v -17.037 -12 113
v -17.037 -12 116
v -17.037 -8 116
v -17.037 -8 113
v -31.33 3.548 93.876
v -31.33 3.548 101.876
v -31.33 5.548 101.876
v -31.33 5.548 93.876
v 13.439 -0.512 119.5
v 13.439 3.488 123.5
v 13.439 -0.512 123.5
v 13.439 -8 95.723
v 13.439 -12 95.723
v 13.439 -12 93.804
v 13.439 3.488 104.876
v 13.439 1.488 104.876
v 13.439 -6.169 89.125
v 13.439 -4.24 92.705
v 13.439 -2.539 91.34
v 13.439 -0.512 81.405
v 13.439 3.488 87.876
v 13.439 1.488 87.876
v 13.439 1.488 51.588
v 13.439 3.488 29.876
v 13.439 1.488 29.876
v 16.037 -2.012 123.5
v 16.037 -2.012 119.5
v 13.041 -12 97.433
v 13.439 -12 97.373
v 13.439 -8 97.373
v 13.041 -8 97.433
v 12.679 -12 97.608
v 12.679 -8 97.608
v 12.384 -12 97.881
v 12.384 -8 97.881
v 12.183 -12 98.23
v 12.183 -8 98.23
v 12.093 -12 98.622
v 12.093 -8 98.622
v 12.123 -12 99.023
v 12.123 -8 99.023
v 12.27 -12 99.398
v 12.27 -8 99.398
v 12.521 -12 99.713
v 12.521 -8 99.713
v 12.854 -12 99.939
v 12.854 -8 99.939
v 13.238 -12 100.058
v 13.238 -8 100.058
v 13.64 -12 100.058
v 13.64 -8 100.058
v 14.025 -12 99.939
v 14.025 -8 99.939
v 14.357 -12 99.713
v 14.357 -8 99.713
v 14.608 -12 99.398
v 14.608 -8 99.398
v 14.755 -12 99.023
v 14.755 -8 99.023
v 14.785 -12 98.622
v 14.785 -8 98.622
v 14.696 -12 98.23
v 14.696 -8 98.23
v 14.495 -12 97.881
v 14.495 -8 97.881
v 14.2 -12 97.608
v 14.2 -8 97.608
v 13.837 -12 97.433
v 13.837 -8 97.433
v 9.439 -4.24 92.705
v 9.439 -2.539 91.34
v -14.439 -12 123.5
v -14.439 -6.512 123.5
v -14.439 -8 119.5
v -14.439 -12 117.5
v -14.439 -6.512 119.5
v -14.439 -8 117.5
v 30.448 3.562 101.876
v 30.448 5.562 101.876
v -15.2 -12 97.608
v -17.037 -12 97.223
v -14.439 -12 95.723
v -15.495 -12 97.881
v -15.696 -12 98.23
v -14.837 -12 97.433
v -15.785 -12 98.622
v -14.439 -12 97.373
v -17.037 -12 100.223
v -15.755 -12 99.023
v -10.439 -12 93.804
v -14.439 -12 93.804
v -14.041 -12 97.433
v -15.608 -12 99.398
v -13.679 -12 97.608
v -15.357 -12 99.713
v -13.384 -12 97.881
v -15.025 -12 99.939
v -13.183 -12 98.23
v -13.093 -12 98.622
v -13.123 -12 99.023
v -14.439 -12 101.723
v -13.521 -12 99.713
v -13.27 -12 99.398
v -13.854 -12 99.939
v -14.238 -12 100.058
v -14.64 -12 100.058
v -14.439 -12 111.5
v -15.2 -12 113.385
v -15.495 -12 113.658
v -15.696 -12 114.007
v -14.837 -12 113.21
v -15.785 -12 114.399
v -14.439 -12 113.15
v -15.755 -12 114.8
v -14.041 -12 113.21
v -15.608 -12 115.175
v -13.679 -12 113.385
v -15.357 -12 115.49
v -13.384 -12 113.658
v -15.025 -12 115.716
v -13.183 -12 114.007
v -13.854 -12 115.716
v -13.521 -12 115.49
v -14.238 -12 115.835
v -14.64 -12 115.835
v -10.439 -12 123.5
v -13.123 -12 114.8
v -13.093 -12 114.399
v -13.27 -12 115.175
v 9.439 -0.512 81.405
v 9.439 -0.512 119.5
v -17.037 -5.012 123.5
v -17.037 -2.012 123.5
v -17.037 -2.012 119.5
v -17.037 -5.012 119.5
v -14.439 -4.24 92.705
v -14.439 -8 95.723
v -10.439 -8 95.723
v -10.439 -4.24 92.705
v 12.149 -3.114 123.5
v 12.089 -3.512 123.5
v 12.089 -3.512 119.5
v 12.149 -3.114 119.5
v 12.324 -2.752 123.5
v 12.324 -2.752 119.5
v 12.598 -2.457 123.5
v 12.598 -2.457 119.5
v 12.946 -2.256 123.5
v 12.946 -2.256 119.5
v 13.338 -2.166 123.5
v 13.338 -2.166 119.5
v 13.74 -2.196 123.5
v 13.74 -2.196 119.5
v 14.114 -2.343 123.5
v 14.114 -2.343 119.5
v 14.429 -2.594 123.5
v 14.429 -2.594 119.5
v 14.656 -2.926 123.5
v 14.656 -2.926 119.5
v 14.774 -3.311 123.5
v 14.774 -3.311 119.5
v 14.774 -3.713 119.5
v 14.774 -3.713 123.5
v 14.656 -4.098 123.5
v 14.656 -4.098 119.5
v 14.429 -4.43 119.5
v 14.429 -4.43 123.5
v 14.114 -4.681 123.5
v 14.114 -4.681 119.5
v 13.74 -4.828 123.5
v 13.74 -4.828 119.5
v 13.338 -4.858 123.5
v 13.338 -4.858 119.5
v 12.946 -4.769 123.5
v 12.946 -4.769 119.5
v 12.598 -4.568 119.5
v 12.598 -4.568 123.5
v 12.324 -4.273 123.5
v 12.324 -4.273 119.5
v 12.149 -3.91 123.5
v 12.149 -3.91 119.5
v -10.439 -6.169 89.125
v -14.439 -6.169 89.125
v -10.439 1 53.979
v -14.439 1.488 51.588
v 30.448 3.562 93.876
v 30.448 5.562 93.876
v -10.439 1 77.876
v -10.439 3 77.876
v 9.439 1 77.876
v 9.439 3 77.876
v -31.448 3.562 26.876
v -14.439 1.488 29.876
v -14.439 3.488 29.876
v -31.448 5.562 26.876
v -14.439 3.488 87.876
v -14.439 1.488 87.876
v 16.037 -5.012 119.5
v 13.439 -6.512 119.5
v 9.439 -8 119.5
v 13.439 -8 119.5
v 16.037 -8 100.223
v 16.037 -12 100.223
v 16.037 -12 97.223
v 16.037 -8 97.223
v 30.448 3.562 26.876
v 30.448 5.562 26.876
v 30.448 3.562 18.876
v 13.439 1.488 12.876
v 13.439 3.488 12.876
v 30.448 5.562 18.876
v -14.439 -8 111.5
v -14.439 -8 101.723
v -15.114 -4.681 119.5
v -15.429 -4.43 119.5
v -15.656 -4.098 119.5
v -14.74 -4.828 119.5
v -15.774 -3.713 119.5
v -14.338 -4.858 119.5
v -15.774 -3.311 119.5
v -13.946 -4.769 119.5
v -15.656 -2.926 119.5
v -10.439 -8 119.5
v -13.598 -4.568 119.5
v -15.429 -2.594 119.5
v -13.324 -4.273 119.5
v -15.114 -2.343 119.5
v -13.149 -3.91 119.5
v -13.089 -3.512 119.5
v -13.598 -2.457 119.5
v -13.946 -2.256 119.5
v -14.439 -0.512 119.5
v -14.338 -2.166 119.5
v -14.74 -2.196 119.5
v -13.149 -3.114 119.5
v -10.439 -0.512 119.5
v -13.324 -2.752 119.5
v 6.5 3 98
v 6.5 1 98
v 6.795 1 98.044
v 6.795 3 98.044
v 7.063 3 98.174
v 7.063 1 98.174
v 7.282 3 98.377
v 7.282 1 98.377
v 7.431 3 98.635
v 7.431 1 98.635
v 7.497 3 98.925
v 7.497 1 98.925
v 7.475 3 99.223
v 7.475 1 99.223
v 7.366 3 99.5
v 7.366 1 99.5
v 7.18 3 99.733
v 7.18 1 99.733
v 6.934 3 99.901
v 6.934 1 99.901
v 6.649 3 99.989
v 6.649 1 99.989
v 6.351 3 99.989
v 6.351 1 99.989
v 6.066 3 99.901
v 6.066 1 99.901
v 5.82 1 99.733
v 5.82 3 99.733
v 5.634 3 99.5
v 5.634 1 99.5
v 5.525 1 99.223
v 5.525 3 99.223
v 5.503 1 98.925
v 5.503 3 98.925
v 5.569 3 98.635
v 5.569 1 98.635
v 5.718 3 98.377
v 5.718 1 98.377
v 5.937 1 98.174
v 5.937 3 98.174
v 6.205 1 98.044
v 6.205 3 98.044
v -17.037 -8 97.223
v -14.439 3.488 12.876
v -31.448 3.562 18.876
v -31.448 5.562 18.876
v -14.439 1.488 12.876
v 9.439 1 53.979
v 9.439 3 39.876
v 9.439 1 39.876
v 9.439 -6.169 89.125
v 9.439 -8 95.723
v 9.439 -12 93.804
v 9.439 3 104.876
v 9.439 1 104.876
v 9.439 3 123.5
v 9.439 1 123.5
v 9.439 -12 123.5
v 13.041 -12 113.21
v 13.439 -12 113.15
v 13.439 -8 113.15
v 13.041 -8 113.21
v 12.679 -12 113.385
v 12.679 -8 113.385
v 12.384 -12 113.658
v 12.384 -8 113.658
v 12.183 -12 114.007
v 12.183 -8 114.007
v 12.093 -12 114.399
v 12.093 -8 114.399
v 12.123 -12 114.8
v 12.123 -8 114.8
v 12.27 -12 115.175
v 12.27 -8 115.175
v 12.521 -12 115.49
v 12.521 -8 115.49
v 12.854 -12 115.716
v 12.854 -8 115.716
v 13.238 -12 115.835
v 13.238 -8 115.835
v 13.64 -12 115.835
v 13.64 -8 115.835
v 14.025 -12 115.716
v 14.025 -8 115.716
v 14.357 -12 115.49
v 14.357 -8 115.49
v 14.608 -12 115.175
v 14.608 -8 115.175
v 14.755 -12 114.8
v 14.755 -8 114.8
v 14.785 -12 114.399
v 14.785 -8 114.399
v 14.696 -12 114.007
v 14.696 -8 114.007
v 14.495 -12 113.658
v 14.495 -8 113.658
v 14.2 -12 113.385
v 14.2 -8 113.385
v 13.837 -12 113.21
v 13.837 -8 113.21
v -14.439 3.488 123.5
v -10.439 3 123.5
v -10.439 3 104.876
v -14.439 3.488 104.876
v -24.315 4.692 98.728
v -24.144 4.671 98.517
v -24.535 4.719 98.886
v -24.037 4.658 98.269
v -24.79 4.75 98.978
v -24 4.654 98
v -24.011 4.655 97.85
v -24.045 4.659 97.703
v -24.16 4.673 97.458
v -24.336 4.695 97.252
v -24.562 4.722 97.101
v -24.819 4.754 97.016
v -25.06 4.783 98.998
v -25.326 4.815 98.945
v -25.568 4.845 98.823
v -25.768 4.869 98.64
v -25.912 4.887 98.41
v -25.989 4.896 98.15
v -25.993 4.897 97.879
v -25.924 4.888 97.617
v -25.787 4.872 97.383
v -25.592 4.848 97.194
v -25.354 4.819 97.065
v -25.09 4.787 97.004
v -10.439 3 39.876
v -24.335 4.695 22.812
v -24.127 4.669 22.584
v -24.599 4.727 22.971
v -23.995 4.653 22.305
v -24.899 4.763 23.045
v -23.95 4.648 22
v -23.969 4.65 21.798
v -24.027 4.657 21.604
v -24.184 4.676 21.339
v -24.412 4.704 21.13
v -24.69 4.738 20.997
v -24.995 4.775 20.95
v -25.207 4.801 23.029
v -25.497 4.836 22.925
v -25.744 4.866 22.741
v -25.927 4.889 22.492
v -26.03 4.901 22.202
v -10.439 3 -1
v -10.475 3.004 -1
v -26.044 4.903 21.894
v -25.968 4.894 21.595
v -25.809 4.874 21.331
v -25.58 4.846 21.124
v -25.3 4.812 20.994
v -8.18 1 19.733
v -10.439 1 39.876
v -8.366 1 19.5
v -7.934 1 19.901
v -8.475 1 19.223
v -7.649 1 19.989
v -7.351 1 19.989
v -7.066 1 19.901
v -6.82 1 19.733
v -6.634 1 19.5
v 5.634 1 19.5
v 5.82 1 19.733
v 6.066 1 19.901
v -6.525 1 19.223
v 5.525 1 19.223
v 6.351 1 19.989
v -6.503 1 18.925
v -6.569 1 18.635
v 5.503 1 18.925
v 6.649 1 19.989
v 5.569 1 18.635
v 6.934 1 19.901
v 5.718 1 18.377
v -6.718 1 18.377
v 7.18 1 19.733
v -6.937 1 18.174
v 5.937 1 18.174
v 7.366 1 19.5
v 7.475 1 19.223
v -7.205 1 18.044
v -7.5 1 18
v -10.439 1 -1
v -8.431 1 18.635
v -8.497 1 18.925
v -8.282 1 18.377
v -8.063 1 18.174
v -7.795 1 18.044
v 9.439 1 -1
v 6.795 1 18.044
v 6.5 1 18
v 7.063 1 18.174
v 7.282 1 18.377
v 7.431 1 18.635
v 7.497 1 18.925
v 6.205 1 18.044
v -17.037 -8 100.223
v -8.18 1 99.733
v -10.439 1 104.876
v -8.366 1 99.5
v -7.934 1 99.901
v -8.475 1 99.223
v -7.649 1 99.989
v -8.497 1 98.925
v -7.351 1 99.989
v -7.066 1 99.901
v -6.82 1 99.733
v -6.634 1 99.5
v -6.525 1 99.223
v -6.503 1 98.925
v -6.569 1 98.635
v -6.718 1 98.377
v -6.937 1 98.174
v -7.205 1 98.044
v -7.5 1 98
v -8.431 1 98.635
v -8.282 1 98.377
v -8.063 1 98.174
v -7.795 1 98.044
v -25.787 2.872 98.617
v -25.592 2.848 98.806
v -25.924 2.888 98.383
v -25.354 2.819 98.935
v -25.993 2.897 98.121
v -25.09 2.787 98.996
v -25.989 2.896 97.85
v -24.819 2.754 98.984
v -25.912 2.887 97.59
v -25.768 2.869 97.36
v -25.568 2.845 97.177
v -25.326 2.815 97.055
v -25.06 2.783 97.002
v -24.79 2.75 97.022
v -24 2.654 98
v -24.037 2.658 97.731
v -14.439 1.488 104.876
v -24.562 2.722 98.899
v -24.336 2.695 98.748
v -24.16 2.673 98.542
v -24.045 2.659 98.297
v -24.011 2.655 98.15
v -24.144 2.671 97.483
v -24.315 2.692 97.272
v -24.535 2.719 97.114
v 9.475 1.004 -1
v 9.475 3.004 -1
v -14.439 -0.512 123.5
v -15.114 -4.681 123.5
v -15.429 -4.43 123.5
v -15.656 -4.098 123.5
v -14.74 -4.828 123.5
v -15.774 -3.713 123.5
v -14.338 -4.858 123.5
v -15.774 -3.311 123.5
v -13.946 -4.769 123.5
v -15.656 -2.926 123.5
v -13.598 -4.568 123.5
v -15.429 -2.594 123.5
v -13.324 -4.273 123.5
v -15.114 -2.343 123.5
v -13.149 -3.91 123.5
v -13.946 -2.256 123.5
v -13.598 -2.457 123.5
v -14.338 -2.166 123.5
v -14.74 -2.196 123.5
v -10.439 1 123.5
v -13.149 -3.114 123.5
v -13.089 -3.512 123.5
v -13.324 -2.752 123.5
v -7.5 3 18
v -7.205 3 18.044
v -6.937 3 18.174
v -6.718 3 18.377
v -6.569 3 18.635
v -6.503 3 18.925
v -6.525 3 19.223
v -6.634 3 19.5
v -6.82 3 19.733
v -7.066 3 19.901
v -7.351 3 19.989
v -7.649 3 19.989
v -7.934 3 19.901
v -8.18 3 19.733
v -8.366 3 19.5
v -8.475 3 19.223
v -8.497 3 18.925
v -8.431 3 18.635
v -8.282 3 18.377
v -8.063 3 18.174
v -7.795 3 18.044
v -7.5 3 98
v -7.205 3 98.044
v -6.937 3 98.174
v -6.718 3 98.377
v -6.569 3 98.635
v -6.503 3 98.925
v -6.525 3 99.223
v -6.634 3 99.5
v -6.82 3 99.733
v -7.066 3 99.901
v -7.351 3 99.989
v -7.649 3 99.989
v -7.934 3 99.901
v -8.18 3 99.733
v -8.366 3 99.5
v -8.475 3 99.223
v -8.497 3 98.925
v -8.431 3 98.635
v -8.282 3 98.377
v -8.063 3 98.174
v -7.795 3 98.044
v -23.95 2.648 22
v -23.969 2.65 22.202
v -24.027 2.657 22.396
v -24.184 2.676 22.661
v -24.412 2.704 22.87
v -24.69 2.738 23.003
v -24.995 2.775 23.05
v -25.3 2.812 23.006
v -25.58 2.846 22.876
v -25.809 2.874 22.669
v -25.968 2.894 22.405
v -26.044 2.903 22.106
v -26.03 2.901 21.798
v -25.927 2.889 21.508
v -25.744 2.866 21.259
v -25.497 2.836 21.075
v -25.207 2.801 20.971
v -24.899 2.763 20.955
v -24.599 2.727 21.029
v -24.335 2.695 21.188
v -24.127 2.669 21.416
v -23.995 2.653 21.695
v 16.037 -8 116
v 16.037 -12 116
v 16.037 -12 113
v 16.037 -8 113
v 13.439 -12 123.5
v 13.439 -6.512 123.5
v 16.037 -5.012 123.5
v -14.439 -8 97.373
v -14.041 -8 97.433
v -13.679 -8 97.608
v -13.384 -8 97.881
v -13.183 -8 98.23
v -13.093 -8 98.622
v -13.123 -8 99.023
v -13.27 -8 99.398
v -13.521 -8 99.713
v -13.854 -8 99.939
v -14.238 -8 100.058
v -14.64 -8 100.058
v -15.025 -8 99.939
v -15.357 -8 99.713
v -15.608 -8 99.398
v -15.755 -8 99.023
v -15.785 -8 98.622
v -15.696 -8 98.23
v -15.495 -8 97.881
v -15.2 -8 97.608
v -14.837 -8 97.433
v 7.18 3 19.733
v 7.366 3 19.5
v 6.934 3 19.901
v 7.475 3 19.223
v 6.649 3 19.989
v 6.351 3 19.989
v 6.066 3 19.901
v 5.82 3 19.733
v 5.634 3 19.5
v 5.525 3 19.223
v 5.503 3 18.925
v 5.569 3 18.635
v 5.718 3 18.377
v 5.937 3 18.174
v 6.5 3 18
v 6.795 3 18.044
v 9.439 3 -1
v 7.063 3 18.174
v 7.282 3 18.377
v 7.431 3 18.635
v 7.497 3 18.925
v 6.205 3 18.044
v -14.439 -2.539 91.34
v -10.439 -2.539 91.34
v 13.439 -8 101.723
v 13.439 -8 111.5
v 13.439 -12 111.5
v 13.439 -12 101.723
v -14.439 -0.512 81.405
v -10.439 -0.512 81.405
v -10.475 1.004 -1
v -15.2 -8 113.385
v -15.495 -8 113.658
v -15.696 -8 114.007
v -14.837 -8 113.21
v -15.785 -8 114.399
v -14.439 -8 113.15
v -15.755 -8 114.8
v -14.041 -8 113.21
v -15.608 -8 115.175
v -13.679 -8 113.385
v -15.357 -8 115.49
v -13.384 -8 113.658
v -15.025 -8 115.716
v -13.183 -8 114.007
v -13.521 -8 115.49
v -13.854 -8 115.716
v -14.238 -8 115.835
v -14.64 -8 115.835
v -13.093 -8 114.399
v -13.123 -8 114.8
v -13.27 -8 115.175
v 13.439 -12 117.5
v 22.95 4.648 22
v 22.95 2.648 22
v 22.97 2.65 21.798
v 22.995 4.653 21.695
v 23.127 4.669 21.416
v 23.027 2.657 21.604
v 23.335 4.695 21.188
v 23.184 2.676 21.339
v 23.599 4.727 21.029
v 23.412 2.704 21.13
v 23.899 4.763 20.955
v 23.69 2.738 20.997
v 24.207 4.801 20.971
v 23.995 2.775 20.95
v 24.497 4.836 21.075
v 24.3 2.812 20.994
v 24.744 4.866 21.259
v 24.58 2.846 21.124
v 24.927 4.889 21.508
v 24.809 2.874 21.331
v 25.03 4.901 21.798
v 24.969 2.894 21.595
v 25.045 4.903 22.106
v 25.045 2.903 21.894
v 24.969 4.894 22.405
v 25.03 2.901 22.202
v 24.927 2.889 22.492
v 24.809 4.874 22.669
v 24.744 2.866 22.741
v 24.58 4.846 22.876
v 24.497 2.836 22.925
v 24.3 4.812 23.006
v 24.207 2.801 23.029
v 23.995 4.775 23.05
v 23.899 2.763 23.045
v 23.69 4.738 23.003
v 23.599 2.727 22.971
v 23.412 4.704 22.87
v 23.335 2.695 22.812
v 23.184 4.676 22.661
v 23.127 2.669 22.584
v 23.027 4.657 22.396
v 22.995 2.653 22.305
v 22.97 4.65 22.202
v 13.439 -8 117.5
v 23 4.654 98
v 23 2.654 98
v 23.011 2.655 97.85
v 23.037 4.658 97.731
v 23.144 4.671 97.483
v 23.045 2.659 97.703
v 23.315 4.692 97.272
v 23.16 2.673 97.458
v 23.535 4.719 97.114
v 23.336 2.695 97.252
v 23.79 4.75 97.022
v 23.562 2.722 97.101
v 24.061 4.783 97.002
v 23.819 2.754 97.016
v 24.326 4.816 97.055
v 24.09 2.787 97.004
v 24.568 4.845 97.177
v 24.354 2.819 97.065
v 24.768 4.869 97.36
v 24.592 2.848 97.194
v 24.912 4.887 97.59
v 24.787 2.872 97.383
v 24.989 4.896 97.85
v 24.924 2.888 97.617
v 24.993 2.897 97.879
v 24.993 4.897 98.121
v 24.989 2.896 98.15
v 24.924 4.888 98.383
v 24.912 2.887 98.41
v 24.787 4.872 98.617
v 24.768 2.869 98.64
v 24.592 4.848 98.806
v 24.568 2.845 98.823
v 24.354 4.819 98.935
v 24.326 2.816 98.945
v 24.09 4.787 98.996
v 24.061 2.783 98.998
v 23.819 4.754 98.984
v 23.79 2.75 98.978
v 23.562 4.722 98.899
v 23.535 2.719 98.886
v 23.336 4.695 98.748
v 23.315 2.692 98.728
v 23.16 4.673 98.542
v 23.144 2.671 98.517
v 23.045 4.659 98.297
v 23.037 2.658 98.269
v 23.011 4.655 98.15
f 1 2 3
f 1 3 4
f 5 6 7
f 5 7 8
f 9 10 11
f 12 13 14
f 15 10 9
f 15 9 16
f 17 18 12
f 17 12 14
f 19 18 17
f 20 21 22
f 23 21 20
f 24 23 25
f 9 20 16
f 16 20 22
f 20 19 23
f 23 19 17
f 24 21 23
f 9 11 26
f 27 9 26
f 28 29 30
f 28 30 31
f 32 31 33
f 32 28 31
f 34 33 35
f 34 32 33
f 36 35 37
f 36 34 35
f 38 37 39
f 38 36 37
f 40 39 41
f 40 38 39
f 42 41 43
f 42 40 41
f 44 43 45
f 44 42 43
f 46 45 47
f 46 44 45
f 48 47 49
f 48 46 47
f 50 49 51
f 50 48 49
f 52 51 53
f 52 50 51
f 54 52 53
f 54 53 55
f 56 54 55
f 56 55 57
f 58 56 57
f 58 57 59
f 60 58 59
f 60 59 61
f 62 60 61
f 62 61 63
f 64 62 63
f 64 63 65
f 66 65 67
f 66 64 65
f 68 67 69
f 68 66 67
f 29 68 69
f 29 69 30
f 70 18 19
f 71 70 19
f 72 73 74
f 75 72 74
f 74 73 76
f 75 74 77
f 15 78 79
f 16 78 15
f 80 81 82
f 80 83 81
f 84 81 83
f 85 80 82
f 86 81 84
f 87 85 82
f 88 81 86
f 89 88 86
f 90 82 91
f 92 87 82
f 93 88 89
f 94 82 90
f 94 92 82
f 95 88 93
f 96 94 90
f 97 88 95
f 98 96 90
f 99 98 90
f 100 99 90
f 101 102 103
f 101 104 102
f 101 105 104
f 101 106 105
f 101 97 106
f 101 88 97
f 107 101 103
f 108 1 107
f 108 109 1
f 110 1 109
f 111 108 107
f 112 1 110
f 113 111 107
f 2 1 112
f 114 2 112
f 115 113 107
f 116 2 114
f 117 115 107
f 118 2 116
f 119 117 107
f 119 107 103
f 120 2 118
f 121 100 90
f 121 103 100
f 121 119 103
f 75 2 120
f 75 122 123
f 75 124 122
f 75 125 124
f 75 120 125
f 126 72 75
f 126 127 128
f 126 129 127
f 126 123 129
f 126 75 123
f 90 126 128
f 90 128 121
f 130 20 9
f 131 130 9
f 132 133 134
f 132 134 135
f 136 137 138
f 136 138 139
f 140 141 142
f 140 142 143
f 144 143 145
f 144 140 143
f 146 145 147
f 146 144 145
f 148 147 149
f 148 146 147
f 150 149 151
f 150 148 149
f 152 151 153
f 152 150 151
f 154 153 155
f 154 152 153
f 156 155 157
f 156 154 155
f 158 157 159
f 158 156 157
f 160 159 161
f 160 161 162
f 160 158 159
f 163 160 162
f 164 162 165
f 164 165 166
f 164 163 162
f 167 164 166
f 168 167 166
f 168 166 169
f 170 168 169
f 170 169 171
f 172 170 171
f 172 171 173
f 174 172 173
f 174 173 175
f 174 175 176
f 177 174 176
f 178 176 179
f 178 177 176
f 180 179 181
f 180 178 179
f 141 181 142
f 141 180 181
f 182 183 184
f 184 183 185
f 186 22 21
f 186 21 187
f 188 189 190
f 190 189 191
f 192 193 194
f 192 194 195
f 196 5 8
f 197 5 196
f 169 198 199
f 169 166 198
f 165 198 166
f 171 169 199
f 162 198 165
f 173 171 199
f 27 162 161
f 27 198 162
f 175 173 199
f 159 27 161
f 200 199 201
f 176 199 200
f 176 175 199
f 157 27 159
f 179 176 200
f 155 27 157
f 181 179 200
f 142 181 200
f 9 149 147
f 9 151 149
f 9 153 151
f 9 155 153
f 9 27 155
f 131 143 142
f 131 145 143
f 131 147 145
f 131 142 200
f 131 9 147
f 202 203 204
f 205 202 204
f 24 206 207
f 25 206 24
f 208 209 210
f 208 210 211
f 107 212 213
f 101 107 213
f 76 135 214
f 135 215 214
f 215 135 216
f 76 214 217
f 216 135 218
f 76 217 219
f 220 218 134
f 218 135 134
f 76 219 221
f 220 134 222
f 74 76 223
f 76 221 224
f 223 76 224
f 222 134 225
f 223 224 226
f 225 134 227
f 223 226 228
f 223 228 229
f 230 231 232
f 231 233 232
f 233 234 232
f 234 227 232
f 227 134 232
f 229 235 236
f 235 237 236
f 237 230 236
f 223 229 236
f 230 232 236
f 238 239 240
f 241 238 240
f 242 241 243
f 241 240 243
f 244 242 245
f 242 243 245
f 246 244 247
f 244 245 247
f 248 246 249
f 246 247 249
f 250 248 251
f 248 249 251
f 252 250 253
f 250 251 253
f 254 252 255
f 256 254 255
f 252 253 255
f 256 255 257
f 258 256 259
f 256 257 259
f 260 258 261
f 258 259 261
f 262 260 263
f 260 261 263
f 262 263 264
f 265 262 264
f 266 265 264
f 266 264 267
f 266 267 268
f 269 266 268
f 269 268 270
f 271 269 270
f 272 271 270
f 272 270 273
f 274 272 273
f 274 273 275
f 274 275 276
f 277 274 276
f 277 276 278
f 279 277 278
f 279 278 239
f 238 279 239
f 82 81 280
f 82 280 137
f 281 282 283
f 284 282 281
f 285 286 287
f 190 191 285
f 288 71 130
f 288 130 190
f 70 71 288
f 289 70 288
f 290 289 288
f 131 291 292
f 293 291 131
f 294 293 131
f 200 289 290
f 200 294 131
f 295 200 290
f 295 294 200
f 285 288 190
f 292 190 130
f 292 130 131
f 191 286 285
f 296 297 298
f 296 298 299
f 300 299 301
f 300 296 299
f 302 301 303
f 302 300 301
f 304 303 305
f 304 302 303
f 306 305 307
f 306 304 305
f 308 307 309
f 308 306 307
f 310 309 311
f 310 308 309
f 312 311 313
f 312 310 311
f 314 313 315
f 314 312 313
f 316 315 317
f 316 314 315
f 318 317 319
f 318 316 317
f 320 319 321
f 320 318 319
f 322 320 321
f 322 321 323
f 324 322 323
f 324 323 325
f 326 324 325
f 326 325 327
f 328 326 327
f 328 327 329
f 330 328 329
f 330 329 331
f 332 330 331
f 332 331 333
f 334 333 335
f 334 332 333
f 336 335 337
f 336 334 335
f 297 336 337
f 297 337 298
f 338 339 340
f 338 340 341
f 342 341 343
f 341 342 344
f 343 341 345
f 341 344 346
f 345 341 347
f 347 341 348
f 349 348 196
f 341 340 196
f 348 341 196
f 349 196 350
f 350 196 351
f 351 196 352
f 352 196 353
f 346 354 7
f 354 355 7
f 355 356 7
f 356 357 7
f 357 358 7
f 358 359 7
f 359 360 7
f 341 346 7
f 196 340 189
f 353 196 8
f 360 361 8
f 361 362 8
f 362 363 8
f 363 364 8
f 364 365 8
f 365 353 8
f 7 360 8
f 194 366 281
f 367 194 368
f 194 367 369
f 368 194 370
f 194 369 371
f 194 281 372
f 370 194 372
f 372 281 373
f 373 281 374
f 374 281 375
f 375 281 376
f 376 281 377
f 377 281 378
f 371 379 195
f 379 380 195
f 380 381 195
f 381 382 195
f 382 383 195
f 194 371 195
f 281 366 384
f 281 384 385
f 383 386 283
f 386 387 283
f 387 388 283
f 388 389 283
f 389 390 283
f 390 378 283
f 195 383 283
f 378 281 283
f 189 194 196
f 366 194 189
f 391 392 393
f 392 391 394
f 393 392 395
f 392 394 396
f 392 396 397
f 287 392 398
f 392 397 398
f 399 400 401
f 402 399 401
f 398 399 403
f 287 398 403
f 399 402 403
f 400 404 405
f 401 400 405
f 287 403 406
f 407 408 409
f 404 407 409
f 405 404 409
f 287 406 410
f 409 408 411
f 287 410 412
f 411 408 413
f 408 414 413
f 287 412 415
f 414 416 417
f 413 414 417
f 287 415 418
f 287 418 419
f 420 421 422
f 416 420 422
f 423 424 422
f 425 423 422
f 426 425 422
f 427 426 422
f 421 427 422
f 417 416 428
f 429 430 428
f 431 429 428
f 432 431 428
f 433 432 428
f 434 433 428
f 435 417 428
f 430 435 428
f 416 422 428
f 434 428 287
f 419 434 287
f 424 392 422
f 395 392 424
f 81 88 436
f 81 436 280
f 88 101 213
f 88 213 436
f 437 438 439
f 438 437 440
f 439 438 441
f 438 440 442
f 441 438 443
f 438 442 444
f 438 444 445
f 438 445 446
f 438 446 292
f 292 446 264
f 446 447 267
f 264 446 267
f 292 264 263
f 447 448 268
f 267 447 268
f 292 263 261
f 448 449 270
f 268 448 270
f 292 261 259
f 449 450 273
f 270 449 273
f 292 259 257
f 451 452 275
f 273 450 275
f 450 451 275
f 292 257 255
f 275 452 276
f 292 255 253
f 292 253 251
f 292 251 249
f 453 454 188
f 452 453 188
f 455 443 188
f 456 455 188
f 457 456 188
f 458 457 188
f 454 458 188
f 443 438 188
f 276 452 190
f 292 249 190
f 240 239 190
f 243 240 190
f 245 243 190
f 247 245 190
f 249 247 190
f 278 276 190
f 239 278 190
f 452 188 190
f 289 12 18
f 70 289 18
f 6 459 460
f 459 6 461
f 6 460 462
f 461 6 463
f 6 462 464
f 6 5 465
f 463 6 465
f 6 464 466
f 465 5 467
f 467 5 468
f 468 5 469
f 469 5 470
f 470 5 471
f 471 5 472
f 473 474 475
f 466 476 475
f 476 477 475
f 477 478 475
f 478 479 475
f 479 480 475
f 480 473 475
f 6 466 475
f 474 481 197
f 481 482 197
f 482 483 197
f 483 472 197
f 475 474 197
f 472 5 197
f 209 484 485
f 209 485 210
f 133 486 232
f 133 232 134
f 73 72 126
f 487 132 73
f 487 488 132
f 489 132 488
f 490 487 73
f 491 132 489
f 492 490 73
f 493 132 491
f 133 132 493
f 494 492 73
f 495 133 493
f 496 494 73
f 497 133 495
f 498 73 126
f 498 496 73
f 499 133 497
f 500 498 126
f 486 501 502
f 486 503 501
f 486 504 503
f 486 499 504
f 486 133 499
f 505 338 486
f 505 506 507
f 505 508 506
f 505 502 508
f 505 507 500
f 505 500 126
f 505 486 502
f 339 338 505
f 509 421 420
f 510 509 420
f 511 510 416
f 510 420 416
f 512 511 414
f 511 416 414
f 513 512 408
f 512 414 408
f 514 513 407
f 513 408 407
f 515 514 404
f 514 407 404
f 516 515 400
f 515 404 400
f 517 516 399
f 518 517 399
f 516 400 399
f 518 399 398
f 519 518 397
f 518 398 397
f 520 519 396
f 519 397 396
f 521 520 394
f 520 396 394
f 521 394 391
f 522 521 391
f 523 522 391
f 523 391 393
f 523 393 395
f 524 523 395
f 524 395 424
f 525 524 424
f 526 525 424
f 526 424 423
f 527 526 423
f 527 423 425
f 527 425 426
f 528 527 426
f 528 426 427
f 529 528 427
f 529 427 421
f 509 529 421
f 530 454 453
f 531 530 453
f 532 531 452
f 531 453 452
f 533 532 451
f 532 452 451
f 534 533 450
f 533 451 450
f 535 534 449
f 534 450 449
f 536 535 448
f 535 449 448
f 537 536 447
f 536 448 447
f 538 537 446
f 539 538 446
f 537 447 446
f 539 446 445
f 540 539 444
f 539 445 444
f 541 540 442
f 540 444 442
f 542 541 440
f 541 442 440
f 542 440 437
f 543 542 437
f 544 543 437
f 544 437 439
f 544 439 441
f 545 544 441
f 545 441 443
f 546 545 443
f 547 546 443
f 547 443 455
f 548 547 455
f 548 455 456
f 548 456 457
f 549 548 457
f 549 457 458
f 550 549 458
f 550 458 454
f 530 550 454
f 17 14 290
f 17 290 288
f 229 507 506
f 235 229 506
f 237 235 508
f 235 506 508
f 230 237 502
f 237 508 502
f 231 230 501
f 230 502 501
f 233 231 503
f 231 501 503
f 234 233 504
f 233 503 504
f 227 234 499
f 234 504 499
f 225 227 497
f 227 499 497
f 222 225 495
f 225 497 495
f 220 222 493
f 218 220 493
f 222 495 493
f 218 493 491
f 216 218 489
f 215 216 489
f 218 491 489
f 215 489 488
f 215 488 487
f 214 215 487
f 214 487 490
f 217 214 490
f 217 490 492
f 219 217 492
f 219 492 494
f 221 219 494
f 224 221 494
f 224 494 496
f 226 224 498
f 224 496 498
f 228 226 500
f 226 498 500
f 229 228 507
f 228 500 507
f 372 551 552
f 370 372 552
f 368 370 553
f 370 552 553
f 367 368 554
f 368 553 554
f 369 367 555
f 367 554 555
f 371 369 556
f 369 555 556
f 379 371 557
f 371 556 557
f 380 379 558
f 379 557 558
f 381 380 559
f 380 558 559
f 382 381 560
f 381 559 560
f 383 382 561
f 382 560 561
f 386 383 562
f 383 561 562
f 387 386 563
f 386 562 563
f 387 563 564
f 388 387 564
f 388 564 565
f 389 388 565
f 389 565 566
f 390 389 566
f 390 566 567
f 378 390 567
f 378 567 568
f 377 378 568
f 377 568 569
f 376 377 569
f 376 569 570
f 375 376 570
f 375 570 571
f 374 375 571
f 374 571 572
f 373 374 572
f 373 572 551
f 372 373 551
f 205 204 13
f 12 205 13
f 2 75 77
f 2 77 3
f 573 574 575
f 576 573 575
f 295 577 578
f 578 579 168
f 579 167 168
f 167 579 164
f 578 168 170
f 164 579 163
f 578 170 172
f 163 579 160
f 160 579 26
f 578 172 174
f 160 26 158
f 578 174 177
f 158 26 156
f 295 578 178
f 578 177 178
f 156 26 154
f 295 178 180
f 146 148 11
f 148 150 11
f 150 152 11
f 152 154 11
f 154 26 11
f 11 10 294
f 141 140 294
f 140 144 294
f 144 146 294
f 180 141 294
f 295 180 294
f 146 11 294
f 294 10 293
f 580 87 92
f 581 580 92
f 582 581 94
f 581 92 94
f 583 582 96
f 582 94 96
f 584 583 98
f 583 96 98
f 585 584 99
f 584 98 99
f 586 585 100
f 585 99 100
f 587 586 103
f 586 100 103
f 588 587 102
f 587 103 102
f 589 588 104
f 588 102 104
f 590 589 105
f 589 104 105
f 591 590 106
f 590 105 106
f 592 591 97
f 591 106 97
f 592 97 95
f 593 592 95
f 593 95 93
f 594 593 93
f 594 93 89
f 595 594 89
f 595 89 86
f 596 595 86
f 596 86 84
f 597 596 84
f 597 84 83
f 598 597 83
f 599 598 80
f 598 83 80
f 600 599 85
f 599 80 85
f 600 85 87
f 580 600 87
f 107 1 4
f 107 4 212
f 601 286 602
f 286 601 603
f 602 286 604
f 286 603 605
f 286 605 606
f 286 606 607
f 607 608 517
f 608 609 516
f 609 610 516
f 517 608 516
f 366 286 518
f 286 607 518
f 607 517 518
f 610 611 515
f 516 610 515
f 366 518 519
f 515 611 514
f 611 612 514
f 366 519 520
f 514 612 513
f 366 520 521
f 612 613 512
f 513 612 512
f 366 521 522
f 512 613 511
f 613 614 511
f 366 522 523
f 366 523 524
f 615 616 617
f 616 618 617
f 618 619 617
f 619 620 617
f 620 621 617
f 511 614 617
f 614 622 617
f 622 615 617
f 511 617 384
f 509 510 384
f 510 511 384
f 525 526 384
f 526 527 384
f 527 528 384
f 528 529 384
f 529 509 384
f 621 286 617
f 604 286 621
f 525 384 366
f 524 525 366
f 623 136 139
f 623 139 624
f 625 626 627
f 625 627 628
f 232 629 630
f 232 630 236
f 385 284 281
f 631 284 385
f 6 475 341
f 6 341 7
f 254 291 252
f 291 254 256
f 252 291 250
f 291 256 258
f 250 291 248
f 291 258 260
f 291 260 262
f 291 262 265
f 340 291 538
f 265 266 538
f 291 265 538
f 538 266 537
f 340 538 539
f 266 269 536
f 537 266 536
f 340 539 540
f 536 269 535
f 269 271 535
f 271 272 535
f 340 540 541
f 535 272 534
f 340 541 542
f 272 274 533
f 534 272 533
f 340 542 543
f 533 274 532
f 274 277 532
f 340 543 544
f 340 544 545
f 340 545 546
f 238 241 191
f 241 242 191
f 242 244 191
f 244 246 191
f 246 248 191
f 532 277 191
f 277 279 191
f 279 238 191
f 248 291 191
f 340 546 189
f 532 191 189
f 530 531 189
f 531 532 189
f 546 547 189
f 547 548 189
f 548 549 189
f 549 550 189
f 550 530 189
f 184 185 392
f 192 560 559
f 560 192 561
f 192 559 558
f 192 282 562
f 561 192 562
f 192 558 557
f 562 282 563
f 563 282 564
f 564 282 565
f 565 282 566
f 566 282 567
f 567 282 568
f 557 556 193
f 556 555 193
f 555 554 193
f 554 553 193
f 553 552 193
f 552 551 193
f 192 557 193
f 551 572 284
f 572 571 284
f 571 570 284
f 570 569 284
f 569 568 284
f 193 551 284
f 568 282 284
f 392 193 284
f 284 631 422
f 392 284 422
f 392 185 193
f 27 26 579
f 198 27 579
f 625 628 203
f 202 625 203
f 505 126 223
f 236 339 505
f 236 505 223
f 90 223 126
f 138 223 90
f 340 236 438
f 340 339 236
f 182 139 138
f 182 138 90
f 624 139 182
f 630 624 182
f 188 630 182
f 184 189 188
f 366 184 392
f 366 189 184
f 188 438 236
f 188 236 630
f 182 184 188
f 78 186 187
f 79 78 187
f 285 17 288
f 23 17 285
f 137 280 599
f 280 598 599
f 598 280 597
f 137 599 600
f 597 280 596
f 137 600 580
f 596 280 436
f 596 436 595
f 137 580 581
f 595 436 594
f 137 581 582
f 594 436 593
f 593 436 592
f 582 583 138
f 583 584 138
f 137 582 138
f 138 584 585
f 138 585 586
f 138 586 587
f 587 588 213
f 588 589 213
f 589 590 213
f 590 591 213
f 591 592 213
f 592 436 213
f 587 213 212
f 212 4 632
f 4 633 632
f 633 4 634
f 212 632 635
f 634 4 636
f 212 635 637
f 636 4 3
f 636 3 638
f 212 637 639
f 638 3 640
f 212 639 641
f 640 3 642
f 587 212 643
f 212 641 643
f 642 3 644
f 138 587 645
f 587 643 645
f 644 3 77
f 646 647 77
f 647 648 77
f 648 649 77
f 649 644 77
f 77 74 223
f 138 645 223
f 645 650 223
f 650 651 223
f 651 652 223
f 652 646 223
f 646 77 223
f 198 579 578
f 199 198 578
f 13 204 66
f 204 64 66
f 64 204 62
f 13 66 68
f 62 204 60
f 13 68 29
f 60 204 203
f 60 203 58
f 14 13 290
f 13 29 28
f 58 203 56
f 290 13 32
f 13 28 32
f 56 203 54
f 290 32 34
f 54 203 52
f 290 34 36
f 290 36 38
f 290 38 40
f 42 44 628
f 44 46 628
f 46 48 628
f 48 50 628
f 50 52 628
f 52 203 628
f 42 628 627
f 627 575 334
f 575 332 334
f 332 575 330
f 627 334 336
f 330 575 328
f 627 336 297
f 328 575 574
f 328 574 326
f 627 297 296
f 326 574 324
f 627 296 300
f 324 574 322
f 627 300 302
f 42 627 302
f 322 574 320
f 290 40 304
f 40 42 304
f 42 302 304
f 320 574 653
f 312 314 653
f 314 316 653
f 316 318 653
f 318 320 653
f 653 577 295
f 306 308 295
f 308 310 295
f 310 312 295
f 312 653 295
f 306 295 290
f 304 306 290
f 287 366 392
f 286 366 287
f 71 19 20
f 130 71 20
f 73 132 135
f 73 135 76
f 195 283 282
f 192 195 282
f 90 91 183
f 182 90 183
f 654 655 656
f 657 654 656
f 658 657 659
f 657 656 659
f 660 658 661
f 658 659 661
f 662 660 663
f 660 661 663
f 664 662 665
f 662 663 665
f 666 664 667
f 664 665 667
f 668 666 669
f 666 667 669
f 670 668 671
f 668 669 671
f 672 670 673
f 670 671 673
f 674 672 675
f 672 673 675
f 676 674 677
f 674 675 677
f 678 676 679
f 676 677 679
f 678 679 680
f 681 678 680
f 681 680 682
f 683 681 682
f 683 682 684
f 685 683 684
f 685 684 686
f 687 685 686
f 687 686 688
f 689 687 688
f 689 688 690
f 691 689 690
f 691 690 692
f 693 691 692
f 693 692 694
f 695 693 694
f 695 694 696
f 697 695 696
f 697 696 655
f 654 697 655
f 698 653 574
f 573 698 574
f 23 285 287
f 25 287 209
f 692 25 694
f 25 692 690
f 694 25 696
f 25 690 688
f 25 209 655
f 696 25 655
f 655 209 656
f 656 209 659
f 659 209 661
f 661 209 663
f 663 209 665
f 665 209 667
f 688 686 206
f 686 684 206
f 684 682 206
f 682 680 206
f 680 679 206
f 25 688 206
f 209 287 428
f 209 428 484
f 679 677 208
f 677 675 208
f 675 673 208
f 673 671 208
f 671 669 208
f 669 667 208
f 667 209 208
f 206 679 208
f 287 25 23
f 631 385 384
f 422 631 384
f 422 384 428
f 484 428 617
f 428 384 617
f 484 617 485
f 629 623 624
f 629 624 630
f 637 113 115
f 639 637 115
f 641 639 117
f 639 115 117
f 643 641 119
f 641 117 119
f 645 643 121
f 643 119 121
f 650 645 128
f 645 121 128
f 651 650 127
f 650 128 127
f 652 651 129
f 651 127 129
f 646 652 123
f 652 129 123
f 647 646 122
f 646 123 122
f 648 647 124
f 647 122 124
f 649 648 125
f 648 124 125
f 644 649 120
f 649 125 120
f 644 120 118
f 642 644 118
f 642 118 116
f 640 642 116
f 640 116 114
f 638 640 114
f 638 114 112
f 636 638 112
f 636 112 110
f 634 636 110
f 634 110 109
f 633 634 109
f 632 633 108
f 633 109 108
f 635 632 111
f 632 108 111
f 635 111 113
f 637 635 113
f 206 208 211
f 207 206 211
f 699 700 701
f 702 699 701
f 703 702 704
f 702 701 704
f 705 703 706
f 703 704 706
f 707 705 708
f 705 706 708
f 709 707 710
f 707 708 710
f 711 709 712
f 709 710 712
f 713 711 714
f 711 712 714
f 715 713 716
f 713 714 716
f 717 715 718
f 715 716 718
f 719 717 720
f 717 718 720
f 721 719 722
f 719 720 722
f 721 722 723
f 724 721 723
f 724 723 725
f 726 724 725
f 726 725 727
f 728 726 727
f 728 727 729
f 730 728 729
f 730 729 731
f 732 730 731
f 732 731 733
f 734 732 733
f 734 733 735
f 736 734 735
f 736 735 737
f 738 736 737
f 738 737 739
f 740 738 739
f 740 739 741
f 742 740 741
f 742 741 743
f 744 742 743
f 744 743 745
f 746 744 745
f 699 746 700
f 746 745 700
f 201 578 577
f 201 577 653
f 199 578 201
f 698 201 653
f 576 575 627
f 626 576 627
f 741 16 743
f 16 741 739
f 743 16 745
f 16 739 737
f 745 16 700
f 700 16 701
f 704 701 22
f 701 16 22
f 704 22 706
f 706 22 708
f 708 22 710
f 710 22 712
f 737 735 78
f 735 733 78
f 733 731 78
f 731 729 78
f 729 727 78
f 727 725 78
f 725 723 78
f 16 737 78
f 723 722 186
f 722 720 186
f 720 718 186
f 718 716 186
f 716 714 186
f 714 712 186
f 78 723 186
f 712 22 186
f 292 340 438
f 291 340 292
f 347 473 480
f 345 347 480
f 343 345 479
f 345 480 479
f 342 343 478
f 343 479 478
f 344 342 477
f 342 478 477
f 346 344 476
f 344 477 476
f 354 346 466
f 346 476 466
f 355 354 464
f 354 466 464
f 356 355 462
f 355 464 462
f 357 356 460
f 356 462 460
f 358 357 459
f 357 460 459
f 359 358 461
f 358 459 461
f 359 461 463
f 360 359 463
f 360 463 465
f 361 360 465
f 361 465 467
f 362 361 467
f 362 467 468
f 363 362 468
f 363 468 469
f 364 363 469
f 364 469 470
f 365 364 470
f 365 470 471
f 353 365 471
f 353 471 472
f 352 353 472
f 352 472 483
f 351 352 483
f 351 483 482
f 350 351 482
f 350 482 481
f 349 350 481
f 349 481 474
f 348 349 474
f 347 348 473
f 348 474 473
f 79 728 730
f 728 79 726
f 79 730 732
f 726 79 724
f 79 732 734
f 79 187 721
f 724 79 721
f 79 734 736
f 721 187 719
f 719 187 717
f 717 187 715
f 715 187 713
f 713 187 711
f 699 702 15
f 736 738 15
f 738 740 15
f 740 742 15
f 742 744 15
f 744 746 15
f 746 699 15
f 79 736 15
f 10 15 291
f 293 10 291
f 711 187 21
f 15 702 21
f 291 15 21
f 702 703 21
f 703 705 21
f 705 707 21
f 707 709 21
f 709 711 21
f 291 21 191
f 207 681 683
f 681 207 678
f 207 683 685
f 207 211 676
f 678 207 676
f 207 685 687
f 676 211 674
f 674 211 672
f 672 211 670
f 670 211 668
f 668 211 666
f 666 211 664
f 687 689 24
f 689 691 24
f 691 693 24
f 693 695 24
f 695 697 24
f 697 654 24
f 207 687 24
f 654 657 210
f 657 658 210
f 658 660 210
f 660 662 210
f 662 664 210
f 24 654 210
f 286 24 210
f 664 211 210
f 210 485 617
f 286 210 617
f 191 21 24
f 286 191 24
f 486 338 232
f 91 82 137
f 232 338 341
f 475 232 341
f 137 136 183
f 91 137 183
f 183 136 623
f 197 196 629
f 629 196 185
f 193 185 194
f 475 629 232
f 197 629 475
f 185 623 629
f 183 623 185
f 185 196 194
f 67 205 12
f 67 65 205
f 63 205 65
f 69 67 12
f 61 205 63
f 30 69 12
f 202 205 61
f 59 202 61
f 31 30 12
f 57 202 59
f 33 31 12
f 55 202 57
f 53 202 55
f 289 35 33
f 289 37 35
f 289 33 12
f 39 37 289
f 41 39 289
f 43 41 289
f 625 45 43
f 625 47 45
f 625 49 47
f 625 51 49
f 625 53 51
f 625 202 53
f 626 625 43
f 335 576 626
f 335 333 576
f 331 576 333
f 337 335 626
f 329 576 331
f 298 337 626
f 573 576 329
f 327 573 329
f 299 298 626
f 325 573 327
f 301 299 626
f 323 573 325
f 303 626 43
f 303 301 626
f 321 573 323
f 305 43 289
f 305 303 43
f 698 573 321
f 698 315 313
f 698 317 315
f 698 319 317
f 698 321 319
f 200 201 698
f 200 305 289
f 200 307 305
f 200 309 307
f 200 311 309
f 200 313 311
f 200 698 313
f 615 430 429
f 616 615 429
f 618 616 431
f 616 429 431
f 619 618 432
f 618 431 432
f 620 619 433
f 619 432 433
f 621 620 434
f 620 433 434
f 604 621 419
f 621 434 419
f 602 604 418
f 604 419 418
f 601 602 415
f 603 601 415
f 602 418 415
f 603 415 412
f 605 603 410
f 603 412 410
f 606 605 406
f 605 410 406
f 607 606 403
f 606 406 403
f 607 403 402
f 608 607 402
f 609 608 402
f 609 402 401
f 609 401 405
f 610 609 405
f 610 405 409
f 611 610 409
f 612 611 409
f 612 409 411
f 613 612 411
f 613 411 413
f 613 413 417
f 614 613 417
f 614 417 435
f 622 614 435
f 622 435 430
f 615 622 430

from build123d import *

# Parameters (mm, degrees)
SKETCH_1_W          = 2
SKETCH_1_H          = 2
EXTRUDE_1_DEPTH     = 3
EXTRUDE_2_DEPTH     = 124.5
SKETCH_3_W          = 6.103798984
SKETCH_3_H          = 7.216344691
CUT_EXTRUDE_1_DEPTH = 100
SKETCH_4_R          = 1
SKETCH_4_R_2        = 1.050016024
SKETCH_4_R_3        = 1.05
CUT_EXTRUDE_2_DEPTH = 100
SKETCH_6_W          = 76.933972046
SKETCH_6_H          = 147.245046369
CUT_EXTRUDE_3_DEPTH = 100
EXTRUDE_3_DEPTH     = 2
EXTRUDE_4_DEPTH     = 4
SKETCH_9_W          = 19.878498858
SKETCH_9_H          = 18.624082489
CUT_EXTRUDE_4_DEPTH = 4
SKETCH_10_W         = 19.878498858
SKETCH_10_H         = 38
CUT_EXTRUDE_5_DEPTH = 4
EXTRUDE_6_DEPTH     = 4
EXTRUDE_7_DEPTH     = 4
SKETCH_14_R         = 1.35
CUT_EXTRUDE_7_DEPTH = 4
SKETCH_15_R         = 1.35
CUT_EXTRUDE_8_DEPTH = 4


with BuildPart() as part:
    # 草图1 → 凸台-拉伸1 (new body)
    with BuildSketch(Plane(origin=(0, 0, 0), x_dir=(1, 0, 0), z_dir=(0, 1, 0))):
        Rectangle(SKETCH_1_W, SKETCH_1_H)
    extrude(amount=EXTRUDE_1_DEPTH)

    # 草图2 → 凸台-拉伸2 (add)
    with BuildSketch(Plane(origin=(0, 0, -1), x_dir=(-1, 0, 0), z_dir=(0, 0, -1))):
        Polygon((-9.439249429, 3), (10.439249429, 3), (31.447953726, 5.562037109), (31.447953726, 3.562037109), (10.439249429, 1), (-9.439249429, 1), (-30.447953726, 3.562037109), (-30.447953726, 5.562037109), align=None)
    extrude(amount=-EXTRUDE_2_DEPTH)

    # 草图3 → 切除-拉伸1 (cut)
    with BuildSketch(Plane.XZ.offset(-1)):
        with Locations((-0.416327581, 1.421882079)):
            Rectangle(SKETCH_3_W, SKETCH_3_H)
    extrude(amount=CUT_EXTRUDE_1_DEPTH, mode=Mode.SUBTRACT)

    # 草图4 → 切除-拉伸2 (cut)
    with BuildSketch(Plane.XZ.offset(-1)):
        with Locations(Location((24, 97.999988001, 0), (0, 0, 180))):
            Circle(SKETCH_4_R)
        with Locations(Location((6.500166, 99, 0), (0, 0, 270))):
            Circle(SKETCH_4_R)
        with Locations(Location((-7.499834, 99, 0), (0, 0, 270))):
            Circle(SKETCH_4_R)
        with Locations((-24.999894002, 97.999988001)):
            Circle(SKETCH_4_R)
        with Locations(Location((6.500166, 19, 0), (0, 0, 270))):
            Circle(SKETCH_4_R)
        with Locations(Location((-7.499834, 19, 0), (0, 0, 270))):
            Circle(SKETCH_4_R)
        with Locations(Location((24, 21.999986001, 0), (0, 0, 180))):
            Circle(SKETCH_4_R_2)
        with Locations((-24.999894002, 21.999986001)):
            Circle(SKETCH_4_R_3)
    extrude(amount=-CUT_EXTRUDE_2_DEPTH, mode=Mode.SUBTRACT)

    # 草图6 → 切除-拉伸3 (cut)
    with BuildSketch(Plane.XZ.offset(-1)):
        with Locations((-0.585190424, 56.41539679)):
            Rectangle(SKETCH_6_W, SKETCH_6_H)
        Polygon((-31.447953726, 18.875917511), (-14.439249429, 12.875917511), (-10.439249429, -1.124082489), (9.439249429, -1.124082489), (13.439249429, 12.875917511), (30.447953726, 18.875917511), (30.447953726, 26.875917511), (13.439249429, 29.875917511), (13.439249429, 87.875917511), (30.447953726, 93.875917511), (30.447953726, 101.875917511), (13.439249429, 104.875917511), (13.439249429, 123.5), (-14.439249429, 123.5), (-14.439249429, 104.875917511), (-31.329711994, 101.875917511), (-31.329711994, 93.875917511), (-14.439249429, 87.875917511), (-14.439249429, 29.875917511), (-31.447953726, 26.875917511), align=None, mode=Mode.SUBTRACT)
    extrude(amount=-CUT_EXTRUDE_3_DEPTH, mode=Mode.SUBTRACT)

    # 草图7 → 凸台-拉伸3 (add)
    with BuildSketch(Plane.XY.offset(123.5)):
        Polygon((-14.439249429, 1.487804878), (-10.439249429, 1), (-10.439249429, -12), (-14.439249429, -12), (-14.439249429, 1), align=None)
    extrude_3 = extrude(amount=-EXTRUDE_3_DEPTH)

    # 草图8 → 凸台-拉伸4 (add)
    with BuildSketch(Plane.ZY.offset(14.439249429)):
        Polygon((51.587761239, 1.487804878), (121.5, 1.487804878), (121.5, -12), (93.804336039, -12), (89.124737206, -6.169338891), align=None)
        Polygon((81.404880427, -0.512195122), (119.5, -0.512195122), (119.5, -8), (106.737581435, -8), (95.722961725, -8), (92.704938742, -4.239620134), (91.339916161, -2.53883672), align=None, mode=Mode.SUBTRACT)
    extrude_4 = extrude(amount=-EXTRUDE_4_DEPTH)

    # 草图9 → 切除-拉伸4 (cut)
    with BuildSketch(Plane(origin=(0, 3, 0), x_dir=(1, 0, 0), z_dir=(0, 1, 0))):
        with Locations((-0.5, -114.187958756)):
            Rectangle(SKETCH_9_W, SKETCH_9_H)
    cut_extrude_4 = extrude(amount=-CUT_EXTRUDE_4_DEPTH, mode=Mode.SUBTRACT)

    # 草图10 → 切除-拉伸5 (cut)
    with BuildSketch(Plane(origin=(0, 3, 0), x_dir=(1, 0, 0), z_dir=(0, 1, 0))):
        with Locations((-0.5, -58.875917511)):
            Rectangle(SKETCH_10_W, SKETCH_10_H)
    cut_extrude_5 = extrude(amount=-CUT_EXTRUDE_5_DEPTH, mode=Mode.SUBTRACT)

    # 草图11 → 凸台-拉伸6 (add)
    with BuildSketch(Plane.XZ.offset(12)):
        Polygon((-17.03732564, 97.222961725), (-14.439249429, 95.722961725), (-14.439249429, 101.722961725), (-17.03732564, 100.222961725), align=None)
        Polygon((-17.03732564, 113), (-14.439249429, 111.5), (-14.439249429, 117.5), (-17.03732564, 116), align=None)
    extrude_6 = extrude(amount=-EXTRUDE_6_DEPTH)

    # 草图13 → 凸台-拉伸7 (add)
    with BuildSketch(Plane.XY.offset(123.5)):
        Polygon((-14.439249429, -6.512195122), (-14.439249429, -0.512195122), (-17.03732564, -2.012195122), (-17.03732564, -5.012195122), align=None)
    extrude_7 = extrude(amount=-EXTRUDE_7_DEPTH)

    # 草图14 → 切除-拉伸7 (cut)
    with BuildSketch(Plane.XY.offset(123.5)):
        with Locations((-14.439249429, -3.512195122)):
            Circle(SKETCH_14_R)
    cut_extrude_7 = extrude(amount=-CUT_EXTRUDE_7_DEPTH, mode=Mode.SUBTRACT)

    # 草图15 → 切除-拉伸8 (cut)
    with BuildSketch(Plane.XZ.offset(12)):
        with Locations(Location((-14.439249429, 98.722961725, 0), (0, 0, 270))):
            Circle(SKETCH_15_R)
        with Locations(Location((-14.439249429, 114.5, 0), (0, 0, 270))):
            Circle(SKETCH_15_R)
    cut_extrude_8 = extrude(amount=-CUT_EXTRUDE_8_DEPTH, mode=Mode.SUBTRACT)

    # 镜向1: 凸台-拉伸3, 凸台-拉伸4, 切除-拉伸4, 切除-拉伸5, 凸台-拉伸6, 凸台-拉伸7, 切除-拉伸7, 切除-拉伸8 across plane
    add(extrude_3.mirror(Plane.ZY.offset(0.5)))
    add(extrude_4.mirror(Plane.ZY.offset(0.5)))
    add(cut_extrude_4.mirror(Plane.ZY.offset(0.5)), mode=Mode.SUBTRACT)
    add(cut_extrude_5.mirror(Plane.ZY.offset(0.5)), mode=Mode.SUBTRACT)
    add(extrude_6.mirror(Plane.ZY.offset(0.5)))
    add(extrude_7.mirror(Plane.ZY.offset(0.5)))
    add(cut_extrude_7.mirror(Plane.ZY.offset(0.5)), mode=Mode.SUBTRACT)
    add(cut_extrude_8.mirror(Plane.ZY.offset(0.5)), mode=Mode.SUBTRACT)


solid = part.part
